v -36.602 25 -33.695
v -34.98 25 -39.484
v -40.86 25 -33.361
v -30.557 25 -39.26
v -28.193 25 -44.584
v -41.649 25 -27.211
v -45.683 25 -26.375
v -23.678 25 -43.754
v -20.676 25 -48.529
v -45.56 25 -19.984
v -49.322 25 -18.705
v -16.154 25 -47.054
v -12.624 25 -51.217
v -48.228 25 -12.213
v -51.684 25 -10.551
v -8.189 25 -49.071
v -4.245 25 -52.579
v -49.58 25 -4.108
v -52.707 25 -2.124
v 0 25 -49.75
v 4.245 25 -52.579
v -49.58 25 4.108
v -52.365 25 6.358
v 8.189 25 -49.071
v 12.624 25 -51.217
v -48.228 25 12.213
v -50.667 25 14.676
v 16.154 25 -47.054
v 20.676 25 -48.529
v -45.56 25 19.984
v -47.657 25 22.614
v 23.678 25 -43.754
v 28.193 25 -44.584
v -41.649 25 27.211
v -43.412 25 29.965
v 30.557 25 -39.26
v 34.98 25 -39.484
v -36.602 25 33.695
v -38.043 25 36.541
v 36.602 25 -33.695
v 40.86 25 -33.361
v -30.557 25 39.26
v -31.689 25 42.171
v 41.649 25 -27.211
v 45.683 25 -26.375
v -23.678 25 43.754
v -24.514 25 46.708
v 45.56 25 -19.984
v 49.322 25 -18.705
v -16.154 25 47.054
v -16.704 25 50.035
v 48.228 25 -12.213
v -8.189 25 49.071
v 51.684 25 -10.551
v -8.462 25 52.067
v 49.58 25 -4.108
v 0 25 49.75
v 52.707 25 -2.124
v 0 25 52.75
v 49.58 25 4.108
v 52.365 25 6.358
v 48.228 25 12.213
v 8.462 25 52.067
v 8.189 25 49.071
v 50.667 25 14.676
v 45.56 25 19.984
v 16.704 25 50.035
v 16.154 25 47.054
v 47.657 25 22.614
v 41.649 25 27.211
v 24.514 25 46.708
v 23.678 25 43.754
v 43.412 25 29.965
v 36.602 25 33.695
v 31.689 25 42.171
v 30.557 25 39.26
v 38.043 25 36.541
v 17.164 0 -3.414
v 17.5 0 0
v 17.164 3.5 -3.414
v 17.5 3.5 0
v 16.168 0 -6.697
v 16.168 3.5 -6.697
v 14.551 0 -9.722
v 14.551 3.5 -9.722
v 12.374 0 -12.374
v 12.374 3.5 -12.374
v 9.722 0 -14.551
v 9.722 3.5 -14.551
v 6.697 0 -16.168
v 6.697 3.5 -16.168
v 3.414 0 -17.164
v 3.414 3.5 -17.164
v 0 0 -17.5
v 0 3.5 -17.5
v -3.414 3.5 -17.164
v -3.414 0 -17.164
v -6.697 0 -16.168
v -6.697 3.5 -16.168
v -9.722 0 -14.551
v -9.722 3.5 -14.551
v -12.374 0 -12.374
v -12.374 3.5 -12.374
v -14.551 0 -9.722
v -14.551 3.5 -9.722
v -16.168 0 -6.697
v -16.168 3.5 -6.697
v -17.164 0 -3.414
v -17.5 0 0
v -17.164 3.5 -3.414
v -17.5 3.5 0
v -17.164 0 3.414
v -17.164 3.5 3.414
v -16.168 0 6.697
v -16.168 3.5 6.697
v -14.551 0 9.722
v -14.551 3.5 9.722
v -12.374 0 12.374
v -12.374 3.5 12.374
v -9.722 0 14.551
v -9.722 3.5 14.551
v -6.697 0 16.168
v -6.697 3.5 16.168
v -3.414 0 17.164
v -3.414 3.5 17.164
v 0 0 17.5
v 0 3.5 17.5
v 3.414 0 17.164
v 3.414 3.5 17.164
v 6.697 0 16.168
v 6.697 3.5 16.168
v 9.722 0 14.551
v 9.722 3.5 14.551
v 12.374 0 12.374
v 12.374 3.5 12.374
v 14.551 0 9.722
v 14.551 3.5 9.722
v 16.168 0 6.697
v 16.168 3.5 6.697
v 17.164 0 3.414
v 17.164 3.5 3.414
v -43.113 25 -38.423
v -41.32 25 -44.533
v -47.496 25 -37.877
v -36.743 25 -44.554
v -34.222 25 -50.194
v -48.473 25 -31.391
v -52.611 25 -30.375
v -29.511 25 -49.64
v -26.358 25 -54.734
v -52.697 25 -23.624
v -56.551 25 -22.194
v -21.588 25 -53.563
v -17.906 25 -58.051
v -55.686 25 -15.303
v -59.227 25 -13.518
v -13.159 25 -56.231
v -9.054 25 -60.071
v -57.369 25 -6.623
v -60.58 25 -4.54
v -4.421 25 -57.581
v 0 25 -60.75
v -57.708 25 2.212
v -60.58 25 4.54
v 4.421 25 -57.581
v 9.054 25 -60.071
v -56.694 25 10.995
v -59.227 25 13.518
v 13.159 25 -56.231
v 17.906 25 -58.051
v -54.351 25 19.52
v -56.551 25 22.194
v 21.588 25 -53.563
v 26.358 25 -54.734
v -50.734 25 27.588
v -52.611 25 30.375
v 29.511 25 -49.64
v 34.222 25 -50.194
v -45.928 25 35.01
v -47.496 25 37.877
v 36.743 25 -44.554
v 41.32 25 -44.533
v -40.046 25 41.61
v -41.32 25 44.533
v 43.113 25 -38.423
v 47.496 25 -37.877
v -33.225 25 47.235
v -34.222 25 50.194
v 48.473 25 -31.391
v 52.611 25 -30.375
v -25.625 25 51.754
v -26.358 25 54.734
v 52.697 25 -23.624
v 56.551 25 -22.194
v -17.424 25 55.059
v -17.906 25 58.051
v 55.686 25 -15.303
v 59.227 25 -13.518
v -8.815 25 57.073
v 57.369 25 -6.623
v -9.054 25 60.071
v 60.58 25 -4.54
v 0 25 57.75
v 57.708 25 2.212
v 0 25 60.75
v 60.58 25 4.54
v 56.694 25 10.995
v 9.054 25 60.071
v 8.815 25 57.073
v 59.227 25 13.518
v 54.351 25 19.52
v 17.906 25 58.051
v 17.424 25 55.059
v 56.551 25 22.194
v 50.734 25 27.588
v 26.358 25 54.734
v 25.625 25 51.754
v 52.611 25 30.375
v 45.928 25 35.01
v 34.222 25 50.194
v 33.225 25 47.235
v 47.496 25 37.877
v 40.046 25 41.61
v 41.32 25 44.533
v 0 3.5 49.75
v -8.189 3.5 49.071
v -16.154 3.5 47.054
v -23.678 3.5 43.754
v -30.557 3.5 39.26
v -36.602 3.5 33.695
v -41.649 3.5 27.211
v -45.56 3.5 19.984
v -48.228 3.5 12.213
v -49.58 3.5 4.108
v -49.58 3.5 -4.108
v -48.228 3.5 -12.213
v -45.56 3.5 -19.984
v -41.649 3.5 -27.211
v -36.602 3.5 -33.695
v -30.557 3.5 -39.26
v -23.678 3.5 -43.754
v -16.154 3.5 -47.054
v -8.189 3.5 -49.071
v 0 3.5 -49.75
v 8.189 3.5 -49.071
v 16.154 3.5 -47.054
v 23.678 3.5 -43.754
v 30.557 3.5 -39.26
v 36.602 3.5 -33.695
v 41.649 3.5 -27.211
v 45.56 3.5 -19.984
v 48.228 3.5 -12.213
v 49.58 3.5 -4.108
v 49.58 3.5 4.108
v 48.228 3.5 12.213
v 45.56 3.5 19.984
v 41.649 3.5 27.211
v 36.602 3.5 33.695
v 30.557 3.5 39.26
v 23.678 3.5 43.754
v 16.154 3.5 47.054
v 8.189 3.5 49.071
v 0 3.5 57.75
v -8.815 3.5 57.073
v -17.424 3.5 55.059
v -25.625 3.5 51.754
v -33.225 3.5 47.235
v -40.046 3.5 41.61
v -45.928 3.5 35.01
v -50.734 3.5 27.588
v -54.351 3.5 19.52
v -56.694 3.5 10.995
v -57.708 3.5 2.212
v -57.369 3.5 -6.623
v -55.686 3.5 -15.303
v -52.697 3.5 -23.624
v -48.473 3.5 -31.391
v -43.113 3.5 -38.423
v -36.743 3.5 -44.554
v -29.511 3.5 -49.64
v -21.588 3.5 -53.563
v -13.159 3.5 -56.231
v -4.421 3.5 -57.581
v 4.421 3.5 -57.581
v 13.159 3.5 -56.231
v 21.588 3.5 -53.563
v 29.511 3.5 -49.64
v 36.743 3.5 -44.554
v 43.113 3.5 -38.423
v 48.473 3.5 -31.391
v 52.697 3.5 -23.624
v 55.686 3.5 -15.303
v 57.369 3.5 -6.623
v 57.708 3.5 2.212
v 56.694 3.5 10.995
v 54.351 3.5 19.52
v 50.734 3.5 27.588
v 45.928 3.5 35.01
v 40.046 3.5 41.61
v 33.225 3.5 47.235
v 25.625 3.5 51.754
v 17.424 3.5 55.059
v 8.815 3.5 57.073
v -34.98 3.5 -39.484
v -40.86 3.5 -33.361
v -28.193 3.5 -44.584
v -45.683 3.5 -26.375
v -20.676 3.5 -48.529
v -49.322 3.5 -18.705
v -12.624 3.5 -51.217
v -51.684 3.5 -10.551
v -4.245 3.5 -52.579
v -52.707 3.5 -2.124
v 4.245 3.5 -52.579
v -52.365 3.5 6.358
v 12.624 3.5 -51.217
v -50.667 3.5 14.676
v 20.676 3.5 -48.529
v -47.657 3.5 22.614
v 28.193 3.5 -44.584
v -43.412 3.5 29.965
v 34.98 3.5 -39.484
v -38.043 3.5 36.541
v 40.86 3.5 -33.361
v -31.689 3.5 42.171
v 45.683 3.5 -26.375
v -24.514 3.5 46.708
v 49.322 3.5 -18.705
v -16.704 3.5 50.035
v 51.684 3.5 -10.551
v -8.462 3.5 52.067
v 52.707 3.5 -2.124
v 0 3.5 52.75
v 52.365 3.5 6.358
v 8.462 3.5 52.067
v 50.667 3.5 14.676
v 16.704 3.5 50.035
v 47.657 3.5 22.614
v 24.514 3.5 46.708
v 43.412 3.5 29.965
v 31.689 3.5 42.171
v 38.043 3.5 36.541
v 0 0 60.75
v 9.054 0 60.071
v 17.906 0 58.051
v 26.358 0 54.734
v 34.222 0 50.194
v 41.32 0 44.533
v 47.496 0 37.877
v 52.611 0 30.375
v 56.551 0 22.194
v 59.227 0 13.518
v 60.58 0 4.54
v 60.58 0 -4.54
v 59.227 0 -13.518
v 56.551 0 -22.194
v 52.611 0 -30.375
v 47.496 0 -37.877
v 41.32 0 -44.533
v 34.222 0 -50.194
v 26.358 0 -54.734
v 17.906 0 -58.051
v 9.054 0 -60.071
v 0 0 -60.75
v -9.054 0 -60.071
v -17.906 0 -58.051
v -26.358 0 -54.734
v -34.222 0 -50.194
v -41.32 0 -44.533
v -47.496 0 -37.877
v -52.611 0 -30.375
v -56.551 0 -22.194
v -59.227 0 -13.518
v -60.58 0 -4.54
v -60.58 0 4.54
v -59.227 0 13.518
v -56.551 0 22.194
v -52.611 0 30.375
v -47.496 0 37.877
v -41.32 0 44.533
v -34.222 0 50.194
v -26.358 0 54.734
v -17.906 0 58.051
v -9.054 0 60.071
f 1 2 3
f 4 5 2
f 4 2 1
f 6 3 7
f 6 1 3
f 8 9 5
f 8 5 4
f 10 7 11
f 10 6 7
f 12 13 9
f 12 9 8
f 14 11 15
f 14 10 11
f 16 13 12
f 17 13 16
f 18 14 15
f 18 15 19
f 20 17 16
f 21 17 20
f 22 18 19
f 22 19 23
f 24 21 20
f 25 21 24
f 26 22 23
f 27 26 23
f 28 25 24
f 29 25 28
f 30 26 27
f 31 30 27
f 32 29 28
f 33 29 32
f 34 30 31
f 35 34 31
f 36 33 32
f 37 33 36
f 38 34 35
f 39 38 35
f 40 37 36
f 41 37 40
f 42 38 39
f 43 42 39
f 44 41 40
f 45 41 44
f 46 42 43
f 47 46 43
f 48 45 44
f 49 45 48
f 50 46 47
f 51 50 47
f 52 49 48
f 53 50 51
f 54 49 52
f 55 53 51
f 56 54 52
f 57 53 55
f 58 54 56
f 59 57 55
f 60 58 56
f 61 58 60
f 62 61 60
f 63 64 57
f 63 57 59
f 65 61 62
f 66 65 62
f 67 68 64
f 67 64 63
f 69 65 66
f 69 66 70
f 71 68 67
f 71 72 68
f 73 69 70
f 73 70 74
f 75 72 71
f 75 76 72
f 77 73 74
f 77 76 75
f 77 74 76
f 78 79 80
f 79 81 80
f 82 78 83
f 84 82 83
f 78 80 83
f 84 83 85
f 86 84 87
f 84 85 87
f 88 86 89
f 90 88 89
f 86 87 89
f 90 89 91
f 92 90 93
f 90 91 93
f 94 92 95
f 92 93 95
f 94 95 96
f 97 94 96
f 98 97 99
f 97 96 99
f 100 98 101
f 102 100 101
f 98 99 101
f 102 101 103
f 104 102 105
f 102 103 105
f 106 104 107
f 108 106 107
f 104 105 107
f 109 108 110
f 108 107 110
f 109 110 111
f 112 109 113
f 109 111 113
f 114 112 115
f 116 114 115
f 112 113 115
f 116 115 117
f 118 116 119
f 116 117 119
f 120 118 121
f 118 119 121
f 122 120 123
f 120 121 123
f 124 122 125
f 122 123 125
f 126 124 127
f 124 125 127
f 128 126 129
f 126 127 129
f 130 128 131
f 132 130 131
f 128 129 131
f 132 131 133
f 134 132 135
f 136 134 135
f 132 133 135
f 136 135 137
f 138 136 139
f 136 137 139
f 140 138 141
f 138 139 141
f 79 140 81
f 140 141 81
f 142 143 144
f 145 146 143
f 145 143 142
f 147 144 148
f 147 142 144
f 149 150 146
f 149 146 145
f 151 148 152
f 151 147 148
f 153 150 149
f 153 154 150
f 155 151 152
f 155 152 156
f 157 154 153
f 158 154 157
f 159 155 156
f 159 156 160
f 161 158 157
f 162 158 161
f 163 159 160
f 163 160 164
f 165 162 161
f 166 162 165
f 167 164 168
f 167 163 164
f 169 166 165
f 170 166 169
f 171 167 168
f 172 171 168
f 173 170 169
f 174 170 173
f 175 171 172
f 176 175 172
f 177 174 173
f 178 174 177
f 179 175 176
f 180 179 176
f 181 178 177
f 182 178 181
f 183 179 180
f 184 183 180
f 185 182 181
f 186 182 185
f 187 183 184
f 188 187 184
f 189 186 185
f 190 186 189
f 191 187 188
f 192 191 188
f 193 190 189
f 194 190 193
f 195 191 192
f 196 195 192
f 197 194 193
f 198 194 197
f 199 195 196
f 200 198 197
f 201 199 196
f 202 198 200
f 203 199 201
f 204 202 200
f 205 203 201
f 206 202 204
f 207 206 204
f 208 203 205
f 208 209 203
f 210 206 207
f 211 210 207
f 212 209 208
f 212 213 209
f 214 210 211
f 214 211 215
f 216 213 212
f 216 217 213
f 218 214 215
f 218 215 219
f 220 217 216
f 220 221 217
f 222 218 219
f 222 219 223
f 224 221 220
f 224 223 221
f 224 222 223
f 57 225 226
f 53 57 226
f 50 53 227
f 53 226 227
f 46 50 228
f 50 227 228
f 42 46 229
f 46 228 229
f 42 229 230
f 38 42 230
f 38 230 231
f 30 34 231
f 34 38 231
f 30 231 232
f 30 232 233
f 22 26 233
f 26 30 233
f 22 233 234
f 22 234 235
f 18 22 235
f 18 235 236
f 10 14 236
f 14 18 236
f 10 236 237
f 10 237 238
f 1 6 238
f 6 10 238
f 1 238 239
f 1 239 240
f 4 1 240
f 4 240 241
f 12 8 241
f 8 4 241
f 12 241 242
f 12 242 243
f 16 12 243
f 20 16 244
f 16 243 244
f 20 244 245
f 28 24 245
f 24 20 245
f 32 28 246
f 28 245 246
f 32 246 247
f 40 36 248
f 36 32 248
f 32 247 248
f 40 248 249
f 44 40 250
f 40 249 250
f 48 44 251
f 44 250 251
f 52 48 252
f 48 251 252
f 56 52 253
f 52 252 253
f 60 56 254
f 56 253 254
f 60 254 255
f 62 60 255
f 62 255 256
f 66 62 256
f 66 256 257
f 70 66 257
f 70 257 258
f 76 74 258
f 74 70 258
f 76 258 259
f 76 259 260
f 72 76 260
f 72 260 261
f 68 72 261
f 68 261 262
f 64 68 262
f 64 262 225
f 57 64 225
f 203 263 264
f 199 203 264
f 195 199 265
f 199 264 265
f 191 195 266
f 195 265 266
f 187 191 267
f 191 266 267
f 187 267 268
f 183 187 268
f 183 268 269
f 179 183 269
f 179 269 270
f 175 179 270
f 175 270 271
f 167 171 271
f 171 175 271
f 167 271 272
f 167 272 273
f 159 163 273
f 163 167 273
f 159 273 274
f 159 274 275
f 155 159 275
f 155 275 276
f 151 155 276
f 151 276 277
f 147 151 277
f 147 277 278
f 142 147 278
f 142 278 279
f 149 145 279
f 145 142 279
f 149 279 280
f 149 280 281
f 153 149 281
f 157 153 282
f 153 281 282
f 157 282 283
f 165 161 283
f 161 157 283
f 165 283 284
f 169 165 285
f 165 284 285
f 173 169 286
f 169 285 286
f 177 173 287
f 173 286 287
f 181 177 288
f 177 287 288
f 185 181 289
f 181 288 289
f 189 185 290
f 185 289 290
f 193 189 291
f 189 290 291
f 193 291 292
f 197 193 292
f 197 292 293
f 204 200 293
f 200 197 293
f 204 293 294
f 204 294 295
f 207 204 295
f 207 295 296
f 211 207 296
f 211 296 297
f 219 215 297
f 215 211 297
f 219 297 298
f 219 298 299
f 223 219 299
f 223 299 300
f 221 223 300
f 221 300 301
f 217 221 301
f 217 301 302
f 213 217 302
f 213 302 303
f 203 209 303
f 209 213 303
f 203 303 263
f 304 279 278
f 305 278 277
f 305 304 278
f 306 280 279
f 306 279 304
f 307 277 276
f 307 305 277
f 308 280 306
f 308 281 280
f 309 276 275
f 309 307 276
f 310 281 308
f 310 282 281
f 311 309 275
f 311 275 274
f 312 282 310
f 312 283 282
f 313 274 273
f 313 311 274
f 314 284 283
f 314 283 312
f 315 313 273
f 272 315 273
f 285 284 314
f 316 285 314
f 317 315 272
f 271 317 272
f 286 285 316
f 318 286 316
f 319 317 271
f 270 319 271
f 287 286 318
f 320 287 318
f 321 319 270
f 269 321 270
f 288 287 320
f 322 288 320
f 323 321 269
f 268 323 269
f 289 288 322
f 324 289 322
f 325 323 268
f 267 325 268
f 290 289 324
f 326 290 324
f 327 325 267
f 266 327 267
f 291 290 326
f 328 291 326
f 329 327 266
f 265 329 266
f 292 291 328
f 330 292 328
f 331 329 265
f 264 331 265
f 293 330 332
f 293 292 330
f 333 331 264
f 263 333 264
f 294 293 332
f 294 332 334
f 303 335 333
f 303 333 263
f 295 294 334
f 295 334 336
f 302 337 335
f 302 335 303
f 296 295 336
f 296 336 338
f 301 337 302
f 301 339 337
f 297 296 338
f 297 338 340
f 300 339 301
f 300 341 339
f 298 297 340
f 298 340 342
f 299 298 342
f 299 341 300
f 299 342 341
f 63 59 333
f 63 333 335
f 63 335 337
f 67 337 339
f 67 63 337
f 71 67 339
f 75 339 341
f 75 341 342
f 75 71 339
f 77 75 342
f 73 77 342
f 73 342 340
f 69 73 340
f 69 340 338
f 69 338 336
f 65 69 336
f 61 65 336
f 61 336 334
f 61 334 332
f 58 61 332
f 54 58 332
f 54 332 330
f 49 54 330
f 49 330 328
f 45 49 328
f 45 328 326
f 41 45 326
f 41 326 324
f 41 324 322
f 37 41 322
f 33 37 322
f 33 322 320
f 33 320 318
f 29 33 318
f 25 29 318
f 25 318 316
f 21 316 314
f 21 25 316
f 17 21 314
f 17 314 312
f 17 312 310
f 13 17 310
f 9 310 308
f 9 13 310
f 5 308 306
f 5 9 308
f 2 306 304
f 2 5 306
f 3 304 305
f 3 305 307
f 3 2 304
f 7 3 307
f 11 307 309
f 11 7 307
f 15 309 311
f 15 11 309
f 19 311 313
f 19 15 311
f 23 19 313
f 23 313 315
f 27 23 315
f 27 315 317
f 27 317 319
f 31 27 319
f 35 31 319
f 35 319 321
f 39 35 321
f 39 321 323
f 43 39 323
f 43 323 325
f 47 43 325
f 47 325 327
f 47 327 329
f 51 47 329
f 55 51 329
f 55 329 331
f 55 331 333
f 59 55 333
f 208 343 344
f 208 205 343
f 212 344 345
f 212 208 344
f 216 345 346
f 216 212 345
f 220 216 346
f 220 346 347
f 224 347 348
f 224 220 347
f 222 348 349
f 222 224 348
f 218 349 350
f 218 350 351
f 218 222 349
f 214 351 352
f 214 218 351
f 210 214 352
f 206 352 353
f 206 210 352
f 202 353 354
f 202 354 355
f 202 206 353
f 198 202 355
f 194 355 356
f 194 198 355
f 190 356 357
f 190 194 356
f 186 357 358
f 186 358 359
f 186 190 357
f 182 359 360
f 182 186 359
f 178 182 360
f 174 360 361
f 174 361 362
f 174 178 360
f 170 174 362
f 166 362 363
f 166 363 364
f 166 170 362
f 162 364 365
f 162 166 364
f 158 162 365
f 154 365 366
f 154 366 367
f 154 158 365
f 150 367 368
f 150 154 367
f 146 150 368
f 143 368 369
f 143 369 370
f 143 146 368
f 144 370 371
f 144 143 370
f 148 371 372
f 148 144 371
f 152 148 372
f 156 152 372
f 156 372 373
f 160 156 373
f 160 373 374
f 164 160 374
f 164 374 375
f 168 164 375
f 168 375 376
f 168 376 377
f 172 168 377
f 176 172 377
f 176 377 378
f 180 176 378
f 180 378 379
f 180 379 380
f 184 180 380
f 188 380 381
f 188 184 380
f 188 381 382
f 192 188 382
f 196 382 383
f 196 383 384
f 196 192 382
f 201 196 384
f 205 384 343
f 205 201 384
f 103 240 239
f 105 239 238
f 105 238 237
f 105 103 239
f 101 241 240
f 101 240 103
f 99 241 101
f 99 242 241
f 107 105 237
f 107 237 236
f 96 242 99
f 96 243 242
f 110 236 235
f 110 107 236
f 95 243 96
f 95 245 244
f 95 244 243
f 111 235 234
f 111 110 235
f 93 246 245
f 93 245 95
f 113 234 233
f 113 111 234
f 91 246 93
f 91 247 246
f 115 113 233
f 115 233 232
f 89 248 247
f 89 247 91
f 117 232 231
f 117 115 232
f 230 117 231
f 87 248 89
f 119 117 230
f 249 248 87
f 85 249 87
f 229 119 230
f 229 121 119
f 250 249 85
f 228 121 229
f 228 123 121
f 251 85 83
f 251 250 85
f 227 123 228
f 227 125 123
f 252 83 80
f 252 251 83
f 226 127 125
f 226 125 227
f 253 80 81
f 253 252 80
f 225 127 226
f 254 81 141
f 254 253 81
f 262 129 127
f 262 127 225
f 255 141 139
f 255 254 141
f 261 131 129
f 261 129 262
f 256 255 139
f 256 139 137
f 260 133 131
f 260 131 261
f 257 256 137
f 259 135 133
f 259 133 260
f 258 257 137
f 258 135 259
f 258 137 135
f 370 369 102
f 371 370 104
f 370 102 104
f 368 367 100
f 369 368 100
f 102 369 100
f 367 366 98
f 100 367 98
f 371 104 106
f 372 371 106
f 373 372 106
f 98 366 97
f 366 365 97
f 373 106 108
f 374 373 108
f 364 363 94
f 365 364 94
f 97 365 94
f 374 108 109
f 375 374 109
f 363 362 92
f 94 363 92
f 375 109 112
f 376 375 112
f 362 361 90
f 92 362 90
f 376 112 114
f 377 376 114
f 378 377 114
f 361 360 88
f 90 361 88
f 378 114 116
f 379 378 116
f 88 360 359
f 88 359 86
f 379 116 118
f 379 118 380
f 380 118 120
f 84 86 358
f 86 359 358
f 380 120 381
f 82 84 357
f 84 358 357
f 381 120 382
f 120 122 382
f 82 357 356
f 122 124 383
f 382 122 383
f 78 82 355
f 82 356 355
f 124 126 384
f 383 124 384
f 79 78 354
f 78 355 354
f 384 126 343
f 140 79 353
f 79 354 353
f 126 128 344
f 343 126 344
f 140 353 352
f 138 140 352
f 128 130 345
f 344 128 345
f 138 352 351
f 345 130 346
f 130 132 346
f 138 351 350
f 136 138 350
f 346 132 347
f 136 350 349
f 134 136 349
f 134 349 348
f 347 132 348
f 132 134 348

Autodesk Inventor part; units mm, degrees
ref_plane "YZ Plane" through (0, 0, 0) normal (1, 0, 0) x (0, 1, 0)
ref_plane "XZ Plane" through (0, 0, 0) normal (0, 1, 0) x (-1, 0, 0)
ref_plane "XY Plane" through (0, 0, 0) normal (0, 0, 1) x (1, 0, 0)
sketch "Sketch1" plane through (0, 0, 0) normal (1, 0, 0) x (0, 1, 0)
  line L0 (0, 0) -> (0, 60.75)
  line L1 (0, 60.75) -> (25, 60.75)
  line L2 (25, 60.75) -> (25, 57.75)
  line L3 (25, 57.75) -> (3.5, 57.75)
  line L4 (3.5, 57.75) -> (3.5, 52.75)
  line L5 (3.5, 52.75) -> (25, 52.75)
  line L6 (25, 52.75) -> (25, 49.75)
  line L7 (25, 49.75) -> (3.5, 49.75)
  line L8 (3.5, 49.75) -> (3.5, 0)
  line L9 (3.5, 0) -> (0, 0)
  line L10 (25, 57.75) -> (25, 52.75) construction
  line L11 (3.5, 55.25) -> (25, 55.25) construction
  line L12 (-5, 0) -> (30, 0) projected
  dimension "d1" = 25
  dimension "d2" = 3
  dimension "d4" = 5
  dimension "d7" = 3.5
  dimension "d8" = 55.25
  dimension "d9" = 3.5
revolve "Revolution1" add sketch "Sketch1" angle 360 about axis through (0, -10, 0) along (0, 1, 0)
sketch "Sketch2" plane through (0, 3.5, 0) normal (0, 1, 0) x (1, 0, 0)
  circle A0 centre (0, 0) radius 17.5
  dimension "d11" = 35
extrude "Extrusion1" cut sketch "Sketch2" against normal blind 40
properties part number "Base"
